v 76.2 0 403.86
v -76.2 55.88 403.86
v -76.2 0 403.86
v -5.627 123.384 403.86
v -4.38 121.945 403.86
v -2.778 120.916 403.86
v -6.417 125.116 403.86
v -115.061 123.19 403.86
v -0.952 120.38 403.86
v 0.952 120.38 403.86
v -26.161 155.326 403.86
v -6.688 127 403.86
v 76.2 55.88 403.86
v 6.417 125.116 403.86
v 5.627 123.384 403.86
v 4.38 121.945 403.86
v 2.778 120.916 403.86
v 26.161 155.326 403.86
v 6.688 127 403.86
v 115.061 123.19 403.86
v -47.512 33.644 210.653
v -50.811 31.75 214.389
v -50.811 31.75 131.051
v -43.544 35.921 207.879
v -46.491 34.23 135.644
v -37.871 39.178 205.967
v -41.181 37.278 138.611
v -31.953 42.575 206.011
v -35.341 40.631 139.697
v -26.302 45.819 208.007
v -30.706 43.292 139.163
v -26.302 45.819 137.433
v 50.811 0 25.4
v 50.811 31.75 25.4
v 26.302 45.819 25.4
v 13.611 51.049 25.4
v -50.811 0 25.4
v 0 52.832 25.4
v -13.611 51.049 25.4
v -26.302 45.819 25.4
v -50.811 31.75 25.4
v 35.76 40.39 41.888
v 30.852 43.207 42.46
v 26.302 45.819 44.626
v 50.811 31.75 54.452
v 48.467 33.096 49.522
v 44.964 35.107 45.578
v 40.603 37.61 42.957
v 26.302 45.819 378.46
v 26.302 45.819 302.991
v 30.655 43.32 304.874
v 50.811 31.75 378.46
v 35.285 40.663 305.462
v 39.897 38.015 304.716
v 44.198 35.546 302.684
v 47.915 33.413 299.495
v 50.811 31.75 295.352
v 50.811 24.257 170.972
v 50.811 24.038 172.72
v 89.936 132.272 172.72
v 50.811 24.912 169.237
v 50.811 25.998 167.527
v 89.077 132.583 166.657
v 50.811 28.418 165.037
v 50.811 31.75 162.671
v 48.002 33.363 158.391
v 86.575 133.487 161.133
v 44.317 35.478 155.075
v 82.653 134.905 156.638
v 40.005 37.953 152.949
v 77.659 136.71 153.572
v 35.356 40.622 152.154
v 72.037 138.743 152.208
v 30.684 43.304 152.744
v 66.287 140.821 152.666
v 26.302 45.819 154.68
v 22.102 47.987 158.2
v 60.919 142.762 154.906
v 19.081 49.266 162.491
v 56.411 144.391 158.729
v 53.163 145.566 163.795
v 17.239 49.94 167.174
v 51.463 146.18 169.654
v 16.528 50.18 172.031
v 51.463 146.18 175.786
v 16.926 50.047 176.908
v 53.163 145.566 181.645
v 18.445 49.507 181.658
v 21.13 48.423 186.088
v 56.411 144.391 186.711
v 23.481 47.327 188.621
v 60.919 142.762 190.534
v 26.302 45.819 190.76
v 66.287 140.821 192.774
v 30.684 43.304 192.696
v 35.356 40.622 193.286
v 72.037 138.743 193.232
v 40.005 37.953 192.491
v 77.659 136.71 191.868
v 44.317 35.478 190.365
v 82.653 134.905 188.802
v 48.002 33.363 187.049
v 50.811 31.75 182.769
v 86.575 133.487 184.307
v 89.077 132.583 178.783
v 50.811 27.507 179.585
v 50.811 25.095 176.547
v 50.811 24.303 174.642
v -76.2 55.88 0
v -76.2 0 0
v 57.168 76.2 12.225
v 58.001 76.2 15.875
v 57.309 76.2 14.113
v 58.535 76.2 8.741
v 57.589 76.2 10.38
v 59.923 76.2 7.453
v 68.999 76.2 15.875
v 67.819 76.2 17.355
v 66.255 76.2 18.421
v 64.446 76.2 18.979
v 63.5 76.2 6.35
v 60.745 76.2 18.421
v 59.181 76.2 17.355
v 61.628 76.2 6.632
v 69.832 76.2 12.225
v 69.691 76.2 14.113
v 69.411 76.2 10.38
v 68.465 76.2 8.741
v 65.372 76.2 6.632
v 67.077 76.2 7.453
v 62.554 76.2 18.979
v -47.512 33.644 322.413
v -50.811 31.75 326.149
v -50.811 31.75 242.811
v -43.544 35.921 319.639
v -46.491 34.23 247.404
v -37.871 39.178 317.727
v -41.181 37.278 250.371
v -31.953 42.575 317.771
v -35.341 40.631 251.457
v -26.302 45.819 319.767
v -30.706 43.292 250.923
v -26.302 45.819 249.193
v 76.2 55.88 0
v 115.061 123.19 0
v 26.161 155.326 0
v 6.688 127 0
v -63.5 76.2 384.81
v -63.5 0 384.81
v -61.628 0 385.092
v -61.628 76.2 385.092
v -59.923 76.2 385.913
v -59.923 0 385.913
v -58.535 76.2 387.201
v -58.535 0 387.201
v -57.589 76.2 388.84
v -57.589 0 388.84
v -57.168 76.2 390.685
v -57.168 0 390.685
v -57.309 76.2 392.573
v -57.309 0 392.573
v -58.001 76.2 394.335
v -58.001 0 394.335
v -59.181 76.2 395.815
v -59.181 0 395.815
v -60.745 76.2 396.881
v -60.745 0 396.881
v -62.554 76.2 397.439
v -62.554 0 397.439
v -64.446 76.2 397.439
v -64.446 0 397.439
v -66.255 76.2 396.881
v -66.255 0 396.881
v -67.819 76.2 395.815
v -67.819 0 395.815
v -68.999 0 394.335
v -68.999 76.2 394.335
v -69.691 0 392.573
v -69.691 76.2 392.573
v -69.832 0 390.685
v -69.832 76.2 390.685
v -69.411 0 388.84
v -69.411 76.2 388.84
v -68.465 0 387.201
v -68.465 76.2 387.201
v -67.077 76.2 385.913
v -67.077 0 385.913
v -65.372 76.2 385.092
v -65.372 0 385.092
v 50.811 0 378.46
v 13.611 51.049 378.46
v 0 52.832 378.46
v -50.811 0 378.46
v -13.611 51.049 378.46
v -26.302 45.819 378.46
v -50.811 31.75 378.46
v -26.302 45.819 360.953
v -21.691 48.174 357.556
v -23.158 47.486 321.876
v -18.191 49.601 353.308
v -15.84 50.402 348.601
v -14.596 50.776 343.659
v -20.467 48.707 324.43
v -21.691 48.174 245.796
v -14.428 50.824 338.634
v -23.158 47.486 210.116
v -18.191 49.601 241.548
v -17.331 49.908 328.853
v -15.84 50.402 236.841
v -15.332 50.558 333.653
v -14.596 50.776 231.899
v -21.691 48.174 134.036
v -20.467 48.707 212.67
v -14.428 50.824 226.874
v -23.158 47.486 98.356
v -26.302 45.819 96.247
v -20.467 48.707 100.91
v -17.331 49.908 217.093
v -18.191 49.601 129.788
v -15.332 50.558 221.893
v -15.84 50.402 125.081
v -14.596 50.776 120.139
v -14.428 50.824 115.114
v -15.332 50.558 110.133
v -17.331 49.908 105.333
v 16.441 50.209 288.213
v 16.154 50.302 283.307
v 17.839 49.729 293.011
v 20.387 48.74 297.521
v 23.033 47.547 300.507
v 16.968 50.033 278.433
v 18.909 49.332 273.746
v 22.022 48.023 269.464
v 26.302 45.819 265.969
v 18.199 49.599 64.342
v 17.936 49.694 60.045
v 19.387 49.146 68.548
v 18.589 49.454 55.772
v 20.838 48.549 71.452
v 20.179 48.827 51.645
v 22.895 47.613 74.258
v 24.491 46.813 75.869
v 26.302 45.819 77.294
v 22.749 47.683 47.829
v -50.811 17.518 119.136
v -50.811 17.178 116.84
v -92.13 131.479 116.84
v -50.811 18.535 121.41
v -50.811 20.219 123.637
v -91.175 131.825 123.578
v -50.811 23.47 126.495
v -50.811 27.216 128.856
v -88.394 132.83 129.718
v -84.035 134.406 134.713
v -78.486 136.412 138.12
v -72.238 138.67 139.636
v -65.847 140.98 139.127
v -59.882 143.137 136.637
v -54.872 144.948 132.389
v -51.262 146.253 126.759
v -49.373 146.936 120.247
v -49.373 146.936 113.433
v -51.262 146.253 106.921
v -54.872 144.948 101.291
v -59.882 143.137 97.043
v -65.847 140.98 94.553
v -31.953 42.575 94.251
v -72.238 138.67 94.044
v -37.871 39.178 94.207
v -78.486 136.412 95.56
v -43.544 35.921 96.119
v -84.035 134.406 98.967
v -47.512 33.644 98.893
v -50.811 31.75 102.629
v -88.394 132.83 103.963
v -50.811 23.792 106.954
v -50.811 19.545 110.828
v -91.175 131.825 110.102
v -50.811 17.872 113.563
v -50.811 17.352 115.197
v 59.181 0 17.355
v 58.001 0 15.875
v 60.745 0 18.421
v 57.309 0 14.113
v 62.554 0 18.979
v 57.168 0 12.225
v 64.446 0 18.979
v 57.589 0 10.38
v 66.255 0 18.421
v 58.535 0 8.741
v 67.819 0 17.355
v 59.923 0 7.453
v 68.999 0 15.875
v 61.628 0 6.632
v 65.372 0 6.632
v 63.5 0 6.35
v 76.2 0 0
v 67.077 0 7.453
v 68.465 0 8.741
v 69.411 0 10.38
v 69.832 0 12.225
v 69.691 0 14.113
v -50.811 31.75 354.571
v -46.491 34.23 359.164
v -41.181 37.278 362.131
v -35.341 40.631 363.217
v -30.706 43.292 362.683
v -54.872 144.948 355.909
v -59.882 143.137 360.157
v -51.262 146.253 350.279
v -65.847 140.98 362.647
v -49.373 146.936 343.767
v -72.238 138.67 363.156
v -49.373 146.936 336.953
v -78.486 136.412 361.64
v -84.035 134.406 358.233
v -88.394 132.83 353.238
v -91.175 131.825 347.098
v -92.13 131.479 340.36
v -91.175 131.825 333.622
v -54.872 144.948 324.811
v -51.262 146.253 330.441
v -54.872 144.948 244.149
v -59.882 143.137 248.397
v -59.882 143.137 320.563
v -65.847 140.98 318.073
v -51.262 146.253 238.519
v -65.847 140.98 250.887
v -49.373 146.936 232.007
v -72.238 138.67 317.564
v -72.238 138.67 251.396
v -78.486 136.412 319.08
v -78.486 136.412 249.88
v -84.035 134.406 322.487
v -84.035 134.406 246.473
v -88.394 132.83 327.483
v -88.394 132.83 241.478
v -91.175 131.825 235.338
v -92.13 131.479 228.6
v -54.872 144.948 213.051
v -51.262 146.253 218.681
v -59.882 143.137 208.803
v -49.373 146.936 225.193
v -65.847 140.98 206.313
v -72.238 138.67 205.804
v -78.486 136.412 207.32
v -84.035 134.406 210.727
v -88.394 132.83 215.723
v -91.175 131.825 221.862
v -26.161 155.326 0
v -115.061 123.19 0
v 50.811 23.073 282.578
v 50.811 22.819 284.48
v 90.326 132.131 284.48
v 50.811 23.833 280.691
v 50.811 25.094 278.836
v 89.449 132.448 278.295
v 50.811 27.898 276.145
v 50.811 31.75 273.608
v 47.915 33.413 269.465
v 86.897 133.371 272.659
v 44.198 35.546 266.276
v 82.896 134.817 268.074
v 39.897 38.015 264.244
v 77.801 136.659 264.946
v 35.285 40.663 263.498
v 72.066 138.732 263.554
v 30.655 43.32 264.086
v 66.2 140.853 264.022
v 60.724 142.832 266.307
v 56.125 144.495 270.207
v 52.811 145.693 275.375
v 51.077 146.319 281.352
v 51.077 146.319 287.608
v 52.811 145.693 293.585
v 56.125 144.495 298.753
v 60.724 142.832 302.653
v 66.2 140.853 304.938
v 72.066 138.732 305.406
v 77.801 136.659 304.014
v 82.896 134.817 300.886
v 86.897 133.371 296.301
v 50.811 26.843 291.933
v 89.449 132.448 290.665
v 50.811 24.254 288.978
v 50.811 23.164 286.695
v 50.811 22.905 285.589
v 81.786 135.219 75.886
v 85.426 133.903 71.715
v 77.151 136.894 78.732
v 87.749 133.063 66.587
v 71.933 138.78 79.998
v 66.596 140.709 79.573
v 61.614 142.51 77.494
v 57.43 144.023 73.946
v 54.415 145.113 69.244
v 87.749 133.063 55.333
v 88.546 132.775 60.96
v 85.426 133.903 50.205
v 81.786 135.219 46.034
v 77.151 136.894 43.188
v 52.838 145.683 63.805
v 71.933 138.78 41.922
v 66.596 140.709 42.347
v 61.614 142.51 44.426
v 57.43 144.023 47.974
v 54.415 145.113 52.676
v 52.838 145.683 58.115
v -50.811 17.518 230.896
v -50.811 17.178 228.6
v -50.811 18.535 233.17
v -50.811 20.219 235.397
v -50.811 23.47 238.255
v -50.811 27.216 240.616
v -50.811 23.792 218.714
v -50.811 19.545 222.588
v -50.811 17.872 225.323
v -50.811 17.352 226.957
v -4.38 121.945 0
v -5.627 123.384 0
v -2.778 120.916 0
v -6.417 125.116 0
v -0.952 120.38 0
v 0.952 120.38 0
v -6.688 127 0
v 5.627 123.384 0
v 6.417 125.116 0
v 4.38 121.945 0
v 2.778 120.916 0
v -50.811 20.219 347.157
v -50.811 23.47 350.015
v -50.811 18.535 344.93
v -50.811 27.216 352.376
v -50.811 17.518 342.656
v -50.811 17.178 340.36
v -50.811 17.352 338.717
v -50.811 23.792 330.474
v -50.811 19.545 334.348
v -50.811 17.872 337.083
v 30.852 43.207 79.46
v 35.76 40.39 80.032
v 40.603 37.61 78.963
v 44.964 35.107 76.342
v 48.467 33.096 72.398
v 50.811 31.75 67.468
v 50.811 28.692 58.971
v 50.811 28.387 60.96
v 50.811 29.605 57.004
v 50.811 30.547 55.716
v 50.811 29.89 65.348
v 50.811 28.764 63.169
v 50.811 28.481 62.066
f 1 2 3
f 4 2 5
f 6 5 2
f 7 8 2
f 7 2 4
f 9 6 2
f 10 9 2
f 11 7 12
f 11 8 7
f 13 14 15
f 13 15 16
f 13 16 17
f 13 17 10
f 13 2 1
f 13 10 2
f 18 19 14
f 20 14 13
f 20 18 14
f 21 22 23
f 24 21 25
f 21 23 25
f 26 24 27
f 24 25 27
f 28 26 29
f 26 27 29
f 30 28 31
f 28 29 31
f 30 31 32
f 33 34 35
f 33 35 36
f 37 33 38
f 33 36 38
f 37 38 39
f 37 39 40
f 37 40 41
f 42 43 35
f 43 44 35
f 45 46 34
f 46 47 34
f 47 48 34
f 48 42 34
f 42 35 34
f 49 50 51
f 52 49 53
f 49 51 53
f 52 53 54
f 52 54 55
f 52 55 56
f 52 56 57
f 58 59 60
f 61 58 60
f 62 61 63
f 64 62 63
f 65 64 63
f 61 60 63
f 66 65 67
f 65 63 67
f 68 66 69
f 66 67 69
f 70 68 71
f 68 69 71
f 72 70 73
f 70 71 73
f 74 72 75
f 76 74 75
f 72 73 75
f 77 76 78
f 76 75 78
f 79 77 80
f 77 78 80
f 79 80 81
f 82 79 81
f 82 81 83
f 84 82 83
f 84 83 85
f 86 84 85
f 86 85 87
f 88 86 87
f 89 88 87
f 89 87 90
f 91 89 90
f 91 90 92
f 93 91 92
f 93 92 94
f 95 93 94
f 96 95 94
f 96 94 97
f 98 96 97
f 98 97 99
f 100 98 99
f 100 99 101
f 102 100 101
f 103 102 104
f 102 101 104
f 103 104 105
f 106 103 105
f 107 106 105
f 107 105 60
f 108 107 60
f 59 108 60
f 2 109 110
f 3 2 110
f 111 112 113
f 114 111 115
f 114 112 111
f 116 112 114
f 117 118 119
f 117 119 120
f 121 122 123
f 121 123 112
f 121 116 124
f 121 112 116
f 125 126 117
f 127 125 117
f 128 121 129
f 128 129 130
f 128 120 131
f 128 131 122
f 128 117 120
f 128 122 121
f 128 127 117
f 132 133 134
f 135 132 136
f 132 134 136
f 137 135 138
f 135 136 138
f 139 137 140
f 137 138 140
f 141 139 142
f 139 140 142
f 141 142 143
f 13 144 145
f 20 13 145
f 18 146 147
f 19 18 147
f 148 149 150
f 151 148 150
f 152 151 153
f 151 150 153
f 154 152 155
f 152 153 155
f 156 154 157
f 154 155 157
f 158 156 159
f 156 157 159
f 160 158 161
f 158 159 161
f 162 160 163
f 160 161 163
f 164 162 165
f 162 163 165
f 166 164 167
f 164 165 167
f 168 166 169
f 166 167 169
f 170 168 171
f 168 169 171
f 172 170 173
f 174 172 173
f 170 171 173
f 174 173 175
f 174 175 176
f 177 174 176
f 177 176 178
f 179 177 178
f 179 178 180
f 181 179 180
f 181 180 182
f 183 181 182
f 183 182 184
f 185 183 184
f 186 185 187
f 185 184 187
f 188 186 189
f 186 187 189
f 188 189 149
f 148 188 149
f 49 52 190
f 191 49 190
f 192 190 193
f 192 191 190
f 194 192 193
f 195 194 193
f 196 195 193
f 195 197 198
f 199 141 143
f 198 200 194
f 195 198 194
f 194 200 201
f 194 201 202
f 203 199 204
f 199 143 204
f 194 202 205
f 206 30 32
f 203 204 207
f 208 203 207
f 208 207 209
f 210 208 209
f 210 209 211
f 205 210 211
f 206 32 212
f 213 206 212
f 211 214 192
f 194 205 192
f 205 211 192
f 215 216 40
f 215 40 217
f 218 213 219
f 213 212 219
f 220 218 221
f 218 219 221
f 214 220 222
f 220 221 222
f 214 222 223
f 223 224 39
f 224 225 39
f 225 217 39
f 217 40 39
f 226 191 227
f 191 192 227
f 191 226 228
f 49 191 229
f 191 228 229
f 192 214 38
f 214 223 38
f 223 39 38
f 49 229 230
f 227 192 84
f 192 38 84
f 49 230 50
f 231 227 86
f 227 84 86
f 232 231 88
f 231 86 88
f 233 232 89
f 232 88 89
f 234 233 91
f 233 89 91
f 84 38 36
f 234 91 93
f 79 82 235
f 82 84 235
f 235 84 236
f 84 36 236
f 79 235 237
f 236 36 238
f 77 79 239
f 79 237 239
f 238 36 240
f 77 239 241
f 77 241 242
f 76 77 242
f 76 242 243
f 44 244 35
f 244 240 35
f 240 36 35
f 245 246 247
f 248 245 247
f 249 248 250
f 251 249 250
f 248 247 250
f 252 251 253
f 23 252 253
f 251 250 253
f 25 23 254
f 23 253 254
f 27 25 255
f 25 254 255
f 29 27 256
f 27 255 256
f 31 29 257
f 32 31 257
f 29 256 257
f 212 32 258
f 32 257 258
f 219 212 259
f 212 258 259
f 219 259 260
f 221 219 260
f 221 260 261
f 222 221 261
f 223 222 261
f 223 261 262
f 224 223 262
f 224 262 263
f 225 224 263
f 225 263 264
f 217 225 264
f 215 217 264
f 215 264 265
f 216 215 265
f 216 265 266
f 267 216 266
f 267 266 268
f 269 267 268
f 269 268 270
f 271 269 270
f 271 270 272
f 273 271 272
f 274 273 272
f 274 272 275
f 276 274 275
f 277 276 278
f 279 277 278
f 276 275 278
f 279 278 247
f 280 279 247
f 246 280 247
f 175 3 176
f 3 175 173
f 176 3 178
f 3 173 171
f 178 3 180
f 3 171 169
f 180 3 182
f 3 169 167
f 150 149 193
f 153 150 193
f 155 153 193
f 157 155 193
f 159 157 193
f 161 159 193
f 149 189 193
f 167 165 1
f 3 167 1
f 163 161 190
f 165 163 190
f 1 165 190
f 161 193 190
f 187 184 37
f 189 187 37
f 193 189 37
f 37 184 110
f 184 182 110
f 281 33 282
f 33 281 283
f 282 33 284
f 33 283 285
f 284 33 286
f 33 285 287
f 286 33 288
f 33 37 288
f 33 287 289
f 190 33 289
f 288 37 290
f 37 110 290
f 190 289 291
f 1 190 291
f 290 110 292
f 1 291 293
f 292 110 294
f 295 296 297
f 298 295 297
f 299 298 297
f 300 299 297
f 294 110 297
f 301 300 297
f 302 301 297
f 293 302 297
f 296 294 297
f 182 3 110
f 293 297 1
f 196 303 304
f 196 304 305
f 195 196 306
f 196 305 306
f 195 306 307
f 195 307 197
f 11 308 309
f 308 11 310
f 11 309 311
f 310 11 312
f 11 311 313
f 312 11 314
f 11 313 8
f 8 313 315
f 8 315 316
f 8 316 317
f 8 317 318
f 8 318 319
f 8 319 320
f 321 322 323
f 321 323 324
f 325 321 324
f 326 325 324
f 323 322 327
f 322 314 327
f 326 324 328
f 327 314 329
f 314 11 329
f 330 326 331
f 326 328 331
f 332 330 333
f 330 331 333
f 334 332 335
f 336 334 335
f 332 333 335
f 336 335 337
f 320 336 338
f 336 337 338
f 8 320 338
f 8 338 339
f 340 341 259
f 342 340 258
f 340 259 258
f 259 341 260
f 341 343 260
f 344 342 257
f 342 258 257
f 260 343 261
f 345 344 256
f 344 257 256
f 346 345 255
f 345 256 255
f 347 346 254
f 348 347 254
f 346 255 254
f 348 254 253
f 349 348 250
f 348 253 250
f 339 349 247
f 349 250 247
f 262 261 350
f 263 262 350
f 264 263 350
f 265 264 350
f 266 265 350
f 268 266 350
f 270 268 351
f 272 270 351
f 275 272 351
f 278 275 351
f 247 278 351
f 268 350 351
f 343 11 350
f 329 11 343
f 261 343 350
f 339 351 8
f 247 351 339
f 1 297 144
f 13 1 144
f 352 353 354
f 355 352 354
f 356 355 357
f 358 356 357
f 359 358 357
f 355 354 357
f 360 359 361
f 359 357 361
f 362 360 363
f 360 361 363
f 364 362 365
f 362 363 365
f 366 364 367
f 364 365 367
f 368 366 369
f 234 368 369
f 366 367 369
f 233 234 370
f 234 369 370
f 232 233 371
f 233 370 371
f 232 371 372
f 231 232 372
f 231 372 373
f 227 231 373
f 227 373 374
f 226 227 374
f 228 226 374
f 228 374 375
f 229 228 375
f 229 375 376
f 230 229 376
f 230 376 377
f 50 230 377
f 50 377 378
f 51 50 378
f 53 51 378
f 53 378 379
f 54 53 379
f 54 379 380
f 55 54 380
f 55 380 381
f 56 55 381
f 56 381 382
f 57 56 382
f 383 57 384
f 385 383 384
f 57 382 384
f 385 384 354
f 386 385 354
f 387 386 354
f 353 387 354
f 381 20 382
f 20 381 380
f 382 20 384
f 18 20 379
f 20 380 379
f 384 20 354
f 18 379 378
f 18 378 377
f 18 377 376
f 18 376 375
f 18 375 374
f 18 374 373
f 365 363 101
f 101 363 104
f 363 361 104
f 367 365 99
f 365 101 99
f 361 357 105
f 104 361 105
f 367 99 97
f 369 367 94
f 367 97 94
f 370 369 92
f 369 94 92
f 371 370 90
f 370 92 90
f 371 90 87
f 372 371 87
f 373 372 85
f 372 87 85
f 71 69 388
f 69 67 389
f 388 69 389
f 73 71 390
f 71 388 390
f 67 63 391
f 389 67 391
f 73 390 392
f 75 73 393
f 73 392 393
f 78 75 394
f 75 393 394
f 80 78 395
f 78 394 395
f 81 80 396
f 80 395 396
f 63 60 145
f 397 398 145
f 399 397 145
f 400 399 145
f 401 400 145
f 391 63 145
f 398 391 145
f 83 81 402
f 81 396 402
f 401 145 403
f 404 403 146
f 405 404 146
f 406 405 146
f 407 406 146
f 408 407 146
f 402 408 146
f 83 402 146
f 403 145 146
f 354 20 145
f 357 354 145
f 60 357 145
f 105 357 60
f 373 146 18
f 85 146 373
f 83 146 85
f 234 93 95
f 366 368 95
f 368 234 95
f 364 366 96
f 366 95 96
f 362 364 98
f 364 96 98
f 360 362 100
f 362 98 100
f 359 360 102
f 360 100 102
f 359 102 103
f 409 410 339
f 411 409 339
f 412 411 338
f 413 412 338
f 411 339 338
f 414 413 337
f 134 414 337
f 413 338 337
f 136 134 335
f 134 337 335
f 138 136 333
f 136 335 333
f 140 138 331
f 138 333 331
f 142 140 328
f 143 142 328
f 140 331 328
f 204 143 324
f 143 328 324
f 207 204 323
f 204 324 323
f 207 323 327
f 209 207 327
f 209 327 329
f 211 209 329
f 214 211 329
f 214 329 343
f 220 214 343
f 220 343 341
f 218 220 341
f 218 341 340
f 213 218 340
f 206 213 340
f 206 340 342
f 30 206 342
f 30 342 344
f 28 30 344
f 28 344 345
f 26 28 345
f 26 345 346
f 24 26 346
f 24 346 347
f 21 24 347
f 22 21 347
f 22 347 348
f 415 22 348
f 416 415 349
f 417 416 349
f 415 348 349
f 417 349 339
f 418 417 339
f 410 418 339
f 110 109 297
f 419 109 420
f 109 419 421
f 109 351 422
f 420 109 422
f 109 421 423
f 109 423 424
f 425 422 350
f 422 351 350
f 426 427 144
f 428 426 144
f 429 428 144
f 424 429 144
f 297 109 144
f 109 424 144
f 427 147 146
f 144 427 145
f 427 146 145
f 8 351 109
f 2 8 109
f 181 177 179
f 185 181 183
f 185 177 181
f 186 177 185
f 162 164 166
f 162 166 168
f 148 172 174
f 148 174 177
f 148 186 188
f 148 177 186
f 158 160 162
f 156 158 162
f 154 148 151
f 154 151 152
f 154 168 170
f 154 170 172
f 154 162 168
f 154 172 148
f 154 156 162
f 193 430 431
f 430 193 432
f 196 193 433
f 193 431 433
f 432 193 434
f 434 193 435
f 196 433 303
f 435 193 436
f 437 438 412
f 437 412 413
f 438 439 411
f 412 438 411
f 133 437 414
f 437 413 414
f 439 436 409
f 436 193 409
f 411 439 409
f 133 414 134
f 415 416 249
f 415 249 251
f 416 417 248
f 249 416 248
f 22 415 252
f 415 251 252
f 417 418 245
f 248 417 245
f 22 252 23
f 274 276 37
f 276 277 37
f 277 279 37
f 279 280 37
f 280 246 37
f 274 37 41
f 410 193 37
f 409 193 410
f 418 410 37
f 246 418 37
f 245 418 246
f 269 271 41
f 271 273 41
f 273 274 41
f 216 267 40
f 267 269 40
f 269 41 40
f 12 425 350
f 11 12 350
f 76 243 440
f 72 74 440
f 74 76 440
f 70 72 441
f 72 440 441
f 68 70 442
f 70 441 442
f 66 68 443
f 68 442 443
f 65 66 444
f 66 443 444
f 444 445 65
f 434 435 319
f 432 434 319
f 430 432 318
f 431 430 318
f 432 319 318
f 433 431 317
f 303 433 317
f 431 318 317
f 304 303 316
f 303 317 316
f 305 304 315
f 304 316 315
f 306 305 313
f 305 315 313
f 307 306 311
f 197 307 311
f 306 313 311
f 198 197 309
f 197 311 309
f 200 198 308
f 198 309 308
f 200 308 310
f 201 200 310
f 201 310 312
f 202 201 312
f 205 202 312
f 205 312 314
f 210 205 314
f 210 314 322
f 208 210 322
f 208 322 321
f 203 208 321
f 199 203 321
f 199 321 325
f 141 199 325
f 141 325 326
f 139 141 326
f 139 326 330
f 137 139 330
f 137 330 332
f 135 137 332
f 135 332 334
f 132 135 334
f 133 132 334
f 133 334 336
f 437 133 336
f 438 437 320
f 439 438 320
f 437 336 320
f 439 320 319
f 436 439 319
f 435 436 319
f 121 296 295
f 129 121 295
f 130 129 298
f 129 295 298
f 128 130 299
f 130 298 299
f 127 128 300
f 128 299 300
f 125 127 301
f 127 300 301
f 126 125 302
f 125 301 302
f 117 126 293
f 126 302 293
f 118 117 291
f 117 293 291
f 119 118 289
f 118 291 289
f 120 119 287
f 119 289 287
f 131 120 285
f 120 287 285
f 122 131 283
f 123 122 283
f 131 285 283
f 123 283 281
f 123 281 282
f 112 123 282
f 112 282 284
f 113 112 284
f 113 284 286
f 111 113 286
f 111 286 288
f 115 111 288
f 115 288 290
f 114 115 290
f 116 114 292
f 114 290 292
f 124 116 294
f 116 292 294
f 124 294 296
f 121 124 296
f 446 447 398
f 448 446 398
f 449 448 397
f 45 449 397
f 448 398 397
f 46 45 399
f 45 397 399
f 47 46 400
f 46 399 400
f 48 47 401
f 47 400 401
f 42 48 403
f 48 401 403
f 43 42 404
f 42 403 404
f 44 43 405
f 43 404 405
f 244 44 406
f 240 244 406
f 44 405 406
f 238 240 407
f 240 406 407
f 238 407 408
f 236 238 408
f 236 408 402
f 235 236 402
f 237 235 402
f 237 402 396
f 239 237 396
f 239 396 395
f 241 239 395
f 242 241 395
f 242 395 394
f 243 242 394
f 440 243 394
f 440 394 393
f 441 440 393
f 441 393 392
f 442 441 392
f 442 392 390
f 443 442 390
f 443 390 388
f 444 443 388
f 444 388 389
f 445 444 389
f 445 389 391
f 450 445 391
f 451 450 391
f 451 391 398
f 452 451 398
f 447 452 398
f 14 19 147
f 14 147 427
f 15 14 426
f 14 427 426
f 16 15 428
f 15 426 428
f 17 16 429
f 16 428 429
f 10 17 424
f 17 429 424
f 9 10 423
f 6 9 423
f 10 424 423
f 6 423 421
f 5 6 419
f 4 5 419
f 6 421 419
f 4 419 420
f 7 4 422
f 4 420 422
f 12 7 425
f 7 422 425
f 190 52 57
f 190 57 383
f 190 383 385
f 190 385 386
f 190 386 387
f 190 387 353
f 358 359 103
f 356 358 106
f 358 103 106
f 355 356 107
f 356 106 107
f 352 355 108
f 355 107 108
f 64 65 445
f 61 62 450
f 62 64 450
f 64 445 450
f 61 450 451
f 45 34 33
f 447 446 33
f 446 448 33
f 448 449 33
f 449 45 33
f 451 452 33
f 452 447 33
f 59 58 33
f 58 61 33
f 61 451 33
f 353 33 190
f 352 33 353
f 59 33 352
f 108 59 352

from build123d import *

# Parameters (mm, degrees)
BOSS_EXTRUDE1_DEPTH = 403.86
BOSS_EXTRUDE2_DEPTH = 403.86
CUT_EXTRUDE2_START  = 19.05
SKETCH3_R           = 19.091620187
SKETCH3_R_2         = 20.569967825
SKETCH3_R_3         = 20.984373032
CUT_EXTRUDE2_DEPTH  = 481.006463827
CUT_EXTRUDE3_START  = 19.05
SKETCH4_R           = 22.86
CUT_EXTRUDE3_DEPTH  = 481.006463827
CUT_EXTRUDE4_START  = 25.4
CUT_EXTRUDE4_DEPTH  = 353.06
SKETCH7_R           = 6.35
CUT_EXTRUDE8_DEPTH  = 76.2


with BuildPart() as part:
    # Sketch1 → Boss-Extrude1 (new body)
    with BuildSketch(Plane.XY):
        with BuildLine():
            Line((76.2, 0), (76.2, 55.88))
            Line((76.2, 55.88), (115.061446619, 123.19))
            Line((115.061446619, 123.19), (26.161446619, 155.326122142))
            Line((26.161446619, 155.326122142), (6.688356563, 127))
            ThreePointArc((6.688356563, 127), (0, 120.311643437), (-6.688356563, 127))
            Line((-6.688356563, 127), (-26.161446619, 155.326122142))
            Line((-26.161446619, 155.326122142), (-115.061446619, 123.19))
            Line((-115.061446619, 123.19), (-76.2, 55.88))
            Line((-76.2, 55.88), (-76.2, 0))
            Line((-76.2, 0), (76.2, 0))
        make_face()
    extrude(amount=BOSS_EXTRUDE1_DEPTH)

    # Sketch1<2> → Boss-Extrude2 (add)
    with BuildSketch(Plane.XY):
        with BuildLine():
            Line((76.2, 0), (76.2, 55.88))
            Line((76.2, 55.88), (115.061446619, 123.19))
            Line((115.061446619, 123.19), (26.161446619, 155.326122142))
            Line((26.161446619, 155.326122142), (6.688356563, 127))
            ThreePointArc((6.688356563, 127), (0, 120.311643437), (-6.688356563, 127))
            Line((-6.688356563, 127), (-26.161446619, 155.326122142))
            Line((-26.161446619, 155.326122142), (-115.061446619, 123.19))
            Line((-115.061446619, 123.19), (-76.2, 55.88))
            Line((-76.2, 55.88), (-76.2, 0))
            Line((-76.2, 0), (76.2, 0))
        make_face()
    extrude(amount=BOSS_EXTRUDE2_DEPTH)

    # Sketch3 → Cut-Extrude2 (cut, through all)
    with BuildSketch(Plane(origin=(52.682660739, 145.73906954, 0), x_dir=(0.9404411643717996, -0.3399564918559638, 0), z_dir=(0.33995649185596377, 0.9404411643717995, 0)).offset(CUT_EXTRUDE2_START)):
        with Locations((19.043177743, -60.96)):
            Circle(SKETCH3_R)
        with Locations((19.043177743, -172.72)):
            Circle(SKETCH3_R_2)
        with Locations((19.043177743, -284.48)):
            Circle(SKETCH3_R_3)
    extrude(amount=-CUT_EXTRUDE2_DEPTH, mode=Mode.SUBTRACT)

    # Sketch4 → Cut-Extrude3 (cut, through all)
    with BuildSketch(Plane(origin=(-52.682660739, 145.73906954, 0), x_dir=(0.9404411643717996, 0.3399564918559638, 0), z_dir=(-0.33995649185596377, 0.9404411643717995, 0)).offset(CUT_EXTRUDE3_START)):
        with Locations((-19.085280601, -116.840003489)):
            Circle(SKETCH4_R)
        with Locations((-19.085280601, -228.600003489)):
            Circle(SKETCH4_R)
        with Locations((-19.085280601, -340.360003489)):
            Circle(SKETCH4_R)
    extrude(amount=-CUT_EXTRUDE3_DEPTH, mode=Mode.SUBTRACT)

    # Sketch6 → Cut-Extrude4 (cut)
    with BuildSketch(Plane.XY.offset(CUT_EXTRUDE4_START)):
        with BuildLine():
            Line((50.811289955, 0), (-50.811289955, 0))
            Line((-50.811289955, 0), (-50.811289955, 31.75))
            Line((-50.811289955, 31.75), (-26.302401749, 45.819252354))
            ThreePointArc((-26.302401749, 45.819252354), (0, 52.832), (26.302401749, 45.819252354))
            Line((26.302401749, 45.819252354), (50.811289955, 31.75))
            Line((50.811289955, 31.75), (50.811289955, 0))
        make_face()
    extrude(amount=CUT_EXTRUDE4_DEPTH, mode=Mode.SUBTRACT)

    # Sketch7 → Cut-Extrude8 (cut)
    with BuildSketch(Plane.XZ):
        with Locations((-63.5, 391.16)):
            Circle(SKETCH7_R)
        with Locations((63.5, 12.7)):
            Circle(SKETCH7_R)
    extrude(amount=-CUT_EXTRUDE8_DEPTH, mode=Mode.SUBTRACT)


solid = part.part
